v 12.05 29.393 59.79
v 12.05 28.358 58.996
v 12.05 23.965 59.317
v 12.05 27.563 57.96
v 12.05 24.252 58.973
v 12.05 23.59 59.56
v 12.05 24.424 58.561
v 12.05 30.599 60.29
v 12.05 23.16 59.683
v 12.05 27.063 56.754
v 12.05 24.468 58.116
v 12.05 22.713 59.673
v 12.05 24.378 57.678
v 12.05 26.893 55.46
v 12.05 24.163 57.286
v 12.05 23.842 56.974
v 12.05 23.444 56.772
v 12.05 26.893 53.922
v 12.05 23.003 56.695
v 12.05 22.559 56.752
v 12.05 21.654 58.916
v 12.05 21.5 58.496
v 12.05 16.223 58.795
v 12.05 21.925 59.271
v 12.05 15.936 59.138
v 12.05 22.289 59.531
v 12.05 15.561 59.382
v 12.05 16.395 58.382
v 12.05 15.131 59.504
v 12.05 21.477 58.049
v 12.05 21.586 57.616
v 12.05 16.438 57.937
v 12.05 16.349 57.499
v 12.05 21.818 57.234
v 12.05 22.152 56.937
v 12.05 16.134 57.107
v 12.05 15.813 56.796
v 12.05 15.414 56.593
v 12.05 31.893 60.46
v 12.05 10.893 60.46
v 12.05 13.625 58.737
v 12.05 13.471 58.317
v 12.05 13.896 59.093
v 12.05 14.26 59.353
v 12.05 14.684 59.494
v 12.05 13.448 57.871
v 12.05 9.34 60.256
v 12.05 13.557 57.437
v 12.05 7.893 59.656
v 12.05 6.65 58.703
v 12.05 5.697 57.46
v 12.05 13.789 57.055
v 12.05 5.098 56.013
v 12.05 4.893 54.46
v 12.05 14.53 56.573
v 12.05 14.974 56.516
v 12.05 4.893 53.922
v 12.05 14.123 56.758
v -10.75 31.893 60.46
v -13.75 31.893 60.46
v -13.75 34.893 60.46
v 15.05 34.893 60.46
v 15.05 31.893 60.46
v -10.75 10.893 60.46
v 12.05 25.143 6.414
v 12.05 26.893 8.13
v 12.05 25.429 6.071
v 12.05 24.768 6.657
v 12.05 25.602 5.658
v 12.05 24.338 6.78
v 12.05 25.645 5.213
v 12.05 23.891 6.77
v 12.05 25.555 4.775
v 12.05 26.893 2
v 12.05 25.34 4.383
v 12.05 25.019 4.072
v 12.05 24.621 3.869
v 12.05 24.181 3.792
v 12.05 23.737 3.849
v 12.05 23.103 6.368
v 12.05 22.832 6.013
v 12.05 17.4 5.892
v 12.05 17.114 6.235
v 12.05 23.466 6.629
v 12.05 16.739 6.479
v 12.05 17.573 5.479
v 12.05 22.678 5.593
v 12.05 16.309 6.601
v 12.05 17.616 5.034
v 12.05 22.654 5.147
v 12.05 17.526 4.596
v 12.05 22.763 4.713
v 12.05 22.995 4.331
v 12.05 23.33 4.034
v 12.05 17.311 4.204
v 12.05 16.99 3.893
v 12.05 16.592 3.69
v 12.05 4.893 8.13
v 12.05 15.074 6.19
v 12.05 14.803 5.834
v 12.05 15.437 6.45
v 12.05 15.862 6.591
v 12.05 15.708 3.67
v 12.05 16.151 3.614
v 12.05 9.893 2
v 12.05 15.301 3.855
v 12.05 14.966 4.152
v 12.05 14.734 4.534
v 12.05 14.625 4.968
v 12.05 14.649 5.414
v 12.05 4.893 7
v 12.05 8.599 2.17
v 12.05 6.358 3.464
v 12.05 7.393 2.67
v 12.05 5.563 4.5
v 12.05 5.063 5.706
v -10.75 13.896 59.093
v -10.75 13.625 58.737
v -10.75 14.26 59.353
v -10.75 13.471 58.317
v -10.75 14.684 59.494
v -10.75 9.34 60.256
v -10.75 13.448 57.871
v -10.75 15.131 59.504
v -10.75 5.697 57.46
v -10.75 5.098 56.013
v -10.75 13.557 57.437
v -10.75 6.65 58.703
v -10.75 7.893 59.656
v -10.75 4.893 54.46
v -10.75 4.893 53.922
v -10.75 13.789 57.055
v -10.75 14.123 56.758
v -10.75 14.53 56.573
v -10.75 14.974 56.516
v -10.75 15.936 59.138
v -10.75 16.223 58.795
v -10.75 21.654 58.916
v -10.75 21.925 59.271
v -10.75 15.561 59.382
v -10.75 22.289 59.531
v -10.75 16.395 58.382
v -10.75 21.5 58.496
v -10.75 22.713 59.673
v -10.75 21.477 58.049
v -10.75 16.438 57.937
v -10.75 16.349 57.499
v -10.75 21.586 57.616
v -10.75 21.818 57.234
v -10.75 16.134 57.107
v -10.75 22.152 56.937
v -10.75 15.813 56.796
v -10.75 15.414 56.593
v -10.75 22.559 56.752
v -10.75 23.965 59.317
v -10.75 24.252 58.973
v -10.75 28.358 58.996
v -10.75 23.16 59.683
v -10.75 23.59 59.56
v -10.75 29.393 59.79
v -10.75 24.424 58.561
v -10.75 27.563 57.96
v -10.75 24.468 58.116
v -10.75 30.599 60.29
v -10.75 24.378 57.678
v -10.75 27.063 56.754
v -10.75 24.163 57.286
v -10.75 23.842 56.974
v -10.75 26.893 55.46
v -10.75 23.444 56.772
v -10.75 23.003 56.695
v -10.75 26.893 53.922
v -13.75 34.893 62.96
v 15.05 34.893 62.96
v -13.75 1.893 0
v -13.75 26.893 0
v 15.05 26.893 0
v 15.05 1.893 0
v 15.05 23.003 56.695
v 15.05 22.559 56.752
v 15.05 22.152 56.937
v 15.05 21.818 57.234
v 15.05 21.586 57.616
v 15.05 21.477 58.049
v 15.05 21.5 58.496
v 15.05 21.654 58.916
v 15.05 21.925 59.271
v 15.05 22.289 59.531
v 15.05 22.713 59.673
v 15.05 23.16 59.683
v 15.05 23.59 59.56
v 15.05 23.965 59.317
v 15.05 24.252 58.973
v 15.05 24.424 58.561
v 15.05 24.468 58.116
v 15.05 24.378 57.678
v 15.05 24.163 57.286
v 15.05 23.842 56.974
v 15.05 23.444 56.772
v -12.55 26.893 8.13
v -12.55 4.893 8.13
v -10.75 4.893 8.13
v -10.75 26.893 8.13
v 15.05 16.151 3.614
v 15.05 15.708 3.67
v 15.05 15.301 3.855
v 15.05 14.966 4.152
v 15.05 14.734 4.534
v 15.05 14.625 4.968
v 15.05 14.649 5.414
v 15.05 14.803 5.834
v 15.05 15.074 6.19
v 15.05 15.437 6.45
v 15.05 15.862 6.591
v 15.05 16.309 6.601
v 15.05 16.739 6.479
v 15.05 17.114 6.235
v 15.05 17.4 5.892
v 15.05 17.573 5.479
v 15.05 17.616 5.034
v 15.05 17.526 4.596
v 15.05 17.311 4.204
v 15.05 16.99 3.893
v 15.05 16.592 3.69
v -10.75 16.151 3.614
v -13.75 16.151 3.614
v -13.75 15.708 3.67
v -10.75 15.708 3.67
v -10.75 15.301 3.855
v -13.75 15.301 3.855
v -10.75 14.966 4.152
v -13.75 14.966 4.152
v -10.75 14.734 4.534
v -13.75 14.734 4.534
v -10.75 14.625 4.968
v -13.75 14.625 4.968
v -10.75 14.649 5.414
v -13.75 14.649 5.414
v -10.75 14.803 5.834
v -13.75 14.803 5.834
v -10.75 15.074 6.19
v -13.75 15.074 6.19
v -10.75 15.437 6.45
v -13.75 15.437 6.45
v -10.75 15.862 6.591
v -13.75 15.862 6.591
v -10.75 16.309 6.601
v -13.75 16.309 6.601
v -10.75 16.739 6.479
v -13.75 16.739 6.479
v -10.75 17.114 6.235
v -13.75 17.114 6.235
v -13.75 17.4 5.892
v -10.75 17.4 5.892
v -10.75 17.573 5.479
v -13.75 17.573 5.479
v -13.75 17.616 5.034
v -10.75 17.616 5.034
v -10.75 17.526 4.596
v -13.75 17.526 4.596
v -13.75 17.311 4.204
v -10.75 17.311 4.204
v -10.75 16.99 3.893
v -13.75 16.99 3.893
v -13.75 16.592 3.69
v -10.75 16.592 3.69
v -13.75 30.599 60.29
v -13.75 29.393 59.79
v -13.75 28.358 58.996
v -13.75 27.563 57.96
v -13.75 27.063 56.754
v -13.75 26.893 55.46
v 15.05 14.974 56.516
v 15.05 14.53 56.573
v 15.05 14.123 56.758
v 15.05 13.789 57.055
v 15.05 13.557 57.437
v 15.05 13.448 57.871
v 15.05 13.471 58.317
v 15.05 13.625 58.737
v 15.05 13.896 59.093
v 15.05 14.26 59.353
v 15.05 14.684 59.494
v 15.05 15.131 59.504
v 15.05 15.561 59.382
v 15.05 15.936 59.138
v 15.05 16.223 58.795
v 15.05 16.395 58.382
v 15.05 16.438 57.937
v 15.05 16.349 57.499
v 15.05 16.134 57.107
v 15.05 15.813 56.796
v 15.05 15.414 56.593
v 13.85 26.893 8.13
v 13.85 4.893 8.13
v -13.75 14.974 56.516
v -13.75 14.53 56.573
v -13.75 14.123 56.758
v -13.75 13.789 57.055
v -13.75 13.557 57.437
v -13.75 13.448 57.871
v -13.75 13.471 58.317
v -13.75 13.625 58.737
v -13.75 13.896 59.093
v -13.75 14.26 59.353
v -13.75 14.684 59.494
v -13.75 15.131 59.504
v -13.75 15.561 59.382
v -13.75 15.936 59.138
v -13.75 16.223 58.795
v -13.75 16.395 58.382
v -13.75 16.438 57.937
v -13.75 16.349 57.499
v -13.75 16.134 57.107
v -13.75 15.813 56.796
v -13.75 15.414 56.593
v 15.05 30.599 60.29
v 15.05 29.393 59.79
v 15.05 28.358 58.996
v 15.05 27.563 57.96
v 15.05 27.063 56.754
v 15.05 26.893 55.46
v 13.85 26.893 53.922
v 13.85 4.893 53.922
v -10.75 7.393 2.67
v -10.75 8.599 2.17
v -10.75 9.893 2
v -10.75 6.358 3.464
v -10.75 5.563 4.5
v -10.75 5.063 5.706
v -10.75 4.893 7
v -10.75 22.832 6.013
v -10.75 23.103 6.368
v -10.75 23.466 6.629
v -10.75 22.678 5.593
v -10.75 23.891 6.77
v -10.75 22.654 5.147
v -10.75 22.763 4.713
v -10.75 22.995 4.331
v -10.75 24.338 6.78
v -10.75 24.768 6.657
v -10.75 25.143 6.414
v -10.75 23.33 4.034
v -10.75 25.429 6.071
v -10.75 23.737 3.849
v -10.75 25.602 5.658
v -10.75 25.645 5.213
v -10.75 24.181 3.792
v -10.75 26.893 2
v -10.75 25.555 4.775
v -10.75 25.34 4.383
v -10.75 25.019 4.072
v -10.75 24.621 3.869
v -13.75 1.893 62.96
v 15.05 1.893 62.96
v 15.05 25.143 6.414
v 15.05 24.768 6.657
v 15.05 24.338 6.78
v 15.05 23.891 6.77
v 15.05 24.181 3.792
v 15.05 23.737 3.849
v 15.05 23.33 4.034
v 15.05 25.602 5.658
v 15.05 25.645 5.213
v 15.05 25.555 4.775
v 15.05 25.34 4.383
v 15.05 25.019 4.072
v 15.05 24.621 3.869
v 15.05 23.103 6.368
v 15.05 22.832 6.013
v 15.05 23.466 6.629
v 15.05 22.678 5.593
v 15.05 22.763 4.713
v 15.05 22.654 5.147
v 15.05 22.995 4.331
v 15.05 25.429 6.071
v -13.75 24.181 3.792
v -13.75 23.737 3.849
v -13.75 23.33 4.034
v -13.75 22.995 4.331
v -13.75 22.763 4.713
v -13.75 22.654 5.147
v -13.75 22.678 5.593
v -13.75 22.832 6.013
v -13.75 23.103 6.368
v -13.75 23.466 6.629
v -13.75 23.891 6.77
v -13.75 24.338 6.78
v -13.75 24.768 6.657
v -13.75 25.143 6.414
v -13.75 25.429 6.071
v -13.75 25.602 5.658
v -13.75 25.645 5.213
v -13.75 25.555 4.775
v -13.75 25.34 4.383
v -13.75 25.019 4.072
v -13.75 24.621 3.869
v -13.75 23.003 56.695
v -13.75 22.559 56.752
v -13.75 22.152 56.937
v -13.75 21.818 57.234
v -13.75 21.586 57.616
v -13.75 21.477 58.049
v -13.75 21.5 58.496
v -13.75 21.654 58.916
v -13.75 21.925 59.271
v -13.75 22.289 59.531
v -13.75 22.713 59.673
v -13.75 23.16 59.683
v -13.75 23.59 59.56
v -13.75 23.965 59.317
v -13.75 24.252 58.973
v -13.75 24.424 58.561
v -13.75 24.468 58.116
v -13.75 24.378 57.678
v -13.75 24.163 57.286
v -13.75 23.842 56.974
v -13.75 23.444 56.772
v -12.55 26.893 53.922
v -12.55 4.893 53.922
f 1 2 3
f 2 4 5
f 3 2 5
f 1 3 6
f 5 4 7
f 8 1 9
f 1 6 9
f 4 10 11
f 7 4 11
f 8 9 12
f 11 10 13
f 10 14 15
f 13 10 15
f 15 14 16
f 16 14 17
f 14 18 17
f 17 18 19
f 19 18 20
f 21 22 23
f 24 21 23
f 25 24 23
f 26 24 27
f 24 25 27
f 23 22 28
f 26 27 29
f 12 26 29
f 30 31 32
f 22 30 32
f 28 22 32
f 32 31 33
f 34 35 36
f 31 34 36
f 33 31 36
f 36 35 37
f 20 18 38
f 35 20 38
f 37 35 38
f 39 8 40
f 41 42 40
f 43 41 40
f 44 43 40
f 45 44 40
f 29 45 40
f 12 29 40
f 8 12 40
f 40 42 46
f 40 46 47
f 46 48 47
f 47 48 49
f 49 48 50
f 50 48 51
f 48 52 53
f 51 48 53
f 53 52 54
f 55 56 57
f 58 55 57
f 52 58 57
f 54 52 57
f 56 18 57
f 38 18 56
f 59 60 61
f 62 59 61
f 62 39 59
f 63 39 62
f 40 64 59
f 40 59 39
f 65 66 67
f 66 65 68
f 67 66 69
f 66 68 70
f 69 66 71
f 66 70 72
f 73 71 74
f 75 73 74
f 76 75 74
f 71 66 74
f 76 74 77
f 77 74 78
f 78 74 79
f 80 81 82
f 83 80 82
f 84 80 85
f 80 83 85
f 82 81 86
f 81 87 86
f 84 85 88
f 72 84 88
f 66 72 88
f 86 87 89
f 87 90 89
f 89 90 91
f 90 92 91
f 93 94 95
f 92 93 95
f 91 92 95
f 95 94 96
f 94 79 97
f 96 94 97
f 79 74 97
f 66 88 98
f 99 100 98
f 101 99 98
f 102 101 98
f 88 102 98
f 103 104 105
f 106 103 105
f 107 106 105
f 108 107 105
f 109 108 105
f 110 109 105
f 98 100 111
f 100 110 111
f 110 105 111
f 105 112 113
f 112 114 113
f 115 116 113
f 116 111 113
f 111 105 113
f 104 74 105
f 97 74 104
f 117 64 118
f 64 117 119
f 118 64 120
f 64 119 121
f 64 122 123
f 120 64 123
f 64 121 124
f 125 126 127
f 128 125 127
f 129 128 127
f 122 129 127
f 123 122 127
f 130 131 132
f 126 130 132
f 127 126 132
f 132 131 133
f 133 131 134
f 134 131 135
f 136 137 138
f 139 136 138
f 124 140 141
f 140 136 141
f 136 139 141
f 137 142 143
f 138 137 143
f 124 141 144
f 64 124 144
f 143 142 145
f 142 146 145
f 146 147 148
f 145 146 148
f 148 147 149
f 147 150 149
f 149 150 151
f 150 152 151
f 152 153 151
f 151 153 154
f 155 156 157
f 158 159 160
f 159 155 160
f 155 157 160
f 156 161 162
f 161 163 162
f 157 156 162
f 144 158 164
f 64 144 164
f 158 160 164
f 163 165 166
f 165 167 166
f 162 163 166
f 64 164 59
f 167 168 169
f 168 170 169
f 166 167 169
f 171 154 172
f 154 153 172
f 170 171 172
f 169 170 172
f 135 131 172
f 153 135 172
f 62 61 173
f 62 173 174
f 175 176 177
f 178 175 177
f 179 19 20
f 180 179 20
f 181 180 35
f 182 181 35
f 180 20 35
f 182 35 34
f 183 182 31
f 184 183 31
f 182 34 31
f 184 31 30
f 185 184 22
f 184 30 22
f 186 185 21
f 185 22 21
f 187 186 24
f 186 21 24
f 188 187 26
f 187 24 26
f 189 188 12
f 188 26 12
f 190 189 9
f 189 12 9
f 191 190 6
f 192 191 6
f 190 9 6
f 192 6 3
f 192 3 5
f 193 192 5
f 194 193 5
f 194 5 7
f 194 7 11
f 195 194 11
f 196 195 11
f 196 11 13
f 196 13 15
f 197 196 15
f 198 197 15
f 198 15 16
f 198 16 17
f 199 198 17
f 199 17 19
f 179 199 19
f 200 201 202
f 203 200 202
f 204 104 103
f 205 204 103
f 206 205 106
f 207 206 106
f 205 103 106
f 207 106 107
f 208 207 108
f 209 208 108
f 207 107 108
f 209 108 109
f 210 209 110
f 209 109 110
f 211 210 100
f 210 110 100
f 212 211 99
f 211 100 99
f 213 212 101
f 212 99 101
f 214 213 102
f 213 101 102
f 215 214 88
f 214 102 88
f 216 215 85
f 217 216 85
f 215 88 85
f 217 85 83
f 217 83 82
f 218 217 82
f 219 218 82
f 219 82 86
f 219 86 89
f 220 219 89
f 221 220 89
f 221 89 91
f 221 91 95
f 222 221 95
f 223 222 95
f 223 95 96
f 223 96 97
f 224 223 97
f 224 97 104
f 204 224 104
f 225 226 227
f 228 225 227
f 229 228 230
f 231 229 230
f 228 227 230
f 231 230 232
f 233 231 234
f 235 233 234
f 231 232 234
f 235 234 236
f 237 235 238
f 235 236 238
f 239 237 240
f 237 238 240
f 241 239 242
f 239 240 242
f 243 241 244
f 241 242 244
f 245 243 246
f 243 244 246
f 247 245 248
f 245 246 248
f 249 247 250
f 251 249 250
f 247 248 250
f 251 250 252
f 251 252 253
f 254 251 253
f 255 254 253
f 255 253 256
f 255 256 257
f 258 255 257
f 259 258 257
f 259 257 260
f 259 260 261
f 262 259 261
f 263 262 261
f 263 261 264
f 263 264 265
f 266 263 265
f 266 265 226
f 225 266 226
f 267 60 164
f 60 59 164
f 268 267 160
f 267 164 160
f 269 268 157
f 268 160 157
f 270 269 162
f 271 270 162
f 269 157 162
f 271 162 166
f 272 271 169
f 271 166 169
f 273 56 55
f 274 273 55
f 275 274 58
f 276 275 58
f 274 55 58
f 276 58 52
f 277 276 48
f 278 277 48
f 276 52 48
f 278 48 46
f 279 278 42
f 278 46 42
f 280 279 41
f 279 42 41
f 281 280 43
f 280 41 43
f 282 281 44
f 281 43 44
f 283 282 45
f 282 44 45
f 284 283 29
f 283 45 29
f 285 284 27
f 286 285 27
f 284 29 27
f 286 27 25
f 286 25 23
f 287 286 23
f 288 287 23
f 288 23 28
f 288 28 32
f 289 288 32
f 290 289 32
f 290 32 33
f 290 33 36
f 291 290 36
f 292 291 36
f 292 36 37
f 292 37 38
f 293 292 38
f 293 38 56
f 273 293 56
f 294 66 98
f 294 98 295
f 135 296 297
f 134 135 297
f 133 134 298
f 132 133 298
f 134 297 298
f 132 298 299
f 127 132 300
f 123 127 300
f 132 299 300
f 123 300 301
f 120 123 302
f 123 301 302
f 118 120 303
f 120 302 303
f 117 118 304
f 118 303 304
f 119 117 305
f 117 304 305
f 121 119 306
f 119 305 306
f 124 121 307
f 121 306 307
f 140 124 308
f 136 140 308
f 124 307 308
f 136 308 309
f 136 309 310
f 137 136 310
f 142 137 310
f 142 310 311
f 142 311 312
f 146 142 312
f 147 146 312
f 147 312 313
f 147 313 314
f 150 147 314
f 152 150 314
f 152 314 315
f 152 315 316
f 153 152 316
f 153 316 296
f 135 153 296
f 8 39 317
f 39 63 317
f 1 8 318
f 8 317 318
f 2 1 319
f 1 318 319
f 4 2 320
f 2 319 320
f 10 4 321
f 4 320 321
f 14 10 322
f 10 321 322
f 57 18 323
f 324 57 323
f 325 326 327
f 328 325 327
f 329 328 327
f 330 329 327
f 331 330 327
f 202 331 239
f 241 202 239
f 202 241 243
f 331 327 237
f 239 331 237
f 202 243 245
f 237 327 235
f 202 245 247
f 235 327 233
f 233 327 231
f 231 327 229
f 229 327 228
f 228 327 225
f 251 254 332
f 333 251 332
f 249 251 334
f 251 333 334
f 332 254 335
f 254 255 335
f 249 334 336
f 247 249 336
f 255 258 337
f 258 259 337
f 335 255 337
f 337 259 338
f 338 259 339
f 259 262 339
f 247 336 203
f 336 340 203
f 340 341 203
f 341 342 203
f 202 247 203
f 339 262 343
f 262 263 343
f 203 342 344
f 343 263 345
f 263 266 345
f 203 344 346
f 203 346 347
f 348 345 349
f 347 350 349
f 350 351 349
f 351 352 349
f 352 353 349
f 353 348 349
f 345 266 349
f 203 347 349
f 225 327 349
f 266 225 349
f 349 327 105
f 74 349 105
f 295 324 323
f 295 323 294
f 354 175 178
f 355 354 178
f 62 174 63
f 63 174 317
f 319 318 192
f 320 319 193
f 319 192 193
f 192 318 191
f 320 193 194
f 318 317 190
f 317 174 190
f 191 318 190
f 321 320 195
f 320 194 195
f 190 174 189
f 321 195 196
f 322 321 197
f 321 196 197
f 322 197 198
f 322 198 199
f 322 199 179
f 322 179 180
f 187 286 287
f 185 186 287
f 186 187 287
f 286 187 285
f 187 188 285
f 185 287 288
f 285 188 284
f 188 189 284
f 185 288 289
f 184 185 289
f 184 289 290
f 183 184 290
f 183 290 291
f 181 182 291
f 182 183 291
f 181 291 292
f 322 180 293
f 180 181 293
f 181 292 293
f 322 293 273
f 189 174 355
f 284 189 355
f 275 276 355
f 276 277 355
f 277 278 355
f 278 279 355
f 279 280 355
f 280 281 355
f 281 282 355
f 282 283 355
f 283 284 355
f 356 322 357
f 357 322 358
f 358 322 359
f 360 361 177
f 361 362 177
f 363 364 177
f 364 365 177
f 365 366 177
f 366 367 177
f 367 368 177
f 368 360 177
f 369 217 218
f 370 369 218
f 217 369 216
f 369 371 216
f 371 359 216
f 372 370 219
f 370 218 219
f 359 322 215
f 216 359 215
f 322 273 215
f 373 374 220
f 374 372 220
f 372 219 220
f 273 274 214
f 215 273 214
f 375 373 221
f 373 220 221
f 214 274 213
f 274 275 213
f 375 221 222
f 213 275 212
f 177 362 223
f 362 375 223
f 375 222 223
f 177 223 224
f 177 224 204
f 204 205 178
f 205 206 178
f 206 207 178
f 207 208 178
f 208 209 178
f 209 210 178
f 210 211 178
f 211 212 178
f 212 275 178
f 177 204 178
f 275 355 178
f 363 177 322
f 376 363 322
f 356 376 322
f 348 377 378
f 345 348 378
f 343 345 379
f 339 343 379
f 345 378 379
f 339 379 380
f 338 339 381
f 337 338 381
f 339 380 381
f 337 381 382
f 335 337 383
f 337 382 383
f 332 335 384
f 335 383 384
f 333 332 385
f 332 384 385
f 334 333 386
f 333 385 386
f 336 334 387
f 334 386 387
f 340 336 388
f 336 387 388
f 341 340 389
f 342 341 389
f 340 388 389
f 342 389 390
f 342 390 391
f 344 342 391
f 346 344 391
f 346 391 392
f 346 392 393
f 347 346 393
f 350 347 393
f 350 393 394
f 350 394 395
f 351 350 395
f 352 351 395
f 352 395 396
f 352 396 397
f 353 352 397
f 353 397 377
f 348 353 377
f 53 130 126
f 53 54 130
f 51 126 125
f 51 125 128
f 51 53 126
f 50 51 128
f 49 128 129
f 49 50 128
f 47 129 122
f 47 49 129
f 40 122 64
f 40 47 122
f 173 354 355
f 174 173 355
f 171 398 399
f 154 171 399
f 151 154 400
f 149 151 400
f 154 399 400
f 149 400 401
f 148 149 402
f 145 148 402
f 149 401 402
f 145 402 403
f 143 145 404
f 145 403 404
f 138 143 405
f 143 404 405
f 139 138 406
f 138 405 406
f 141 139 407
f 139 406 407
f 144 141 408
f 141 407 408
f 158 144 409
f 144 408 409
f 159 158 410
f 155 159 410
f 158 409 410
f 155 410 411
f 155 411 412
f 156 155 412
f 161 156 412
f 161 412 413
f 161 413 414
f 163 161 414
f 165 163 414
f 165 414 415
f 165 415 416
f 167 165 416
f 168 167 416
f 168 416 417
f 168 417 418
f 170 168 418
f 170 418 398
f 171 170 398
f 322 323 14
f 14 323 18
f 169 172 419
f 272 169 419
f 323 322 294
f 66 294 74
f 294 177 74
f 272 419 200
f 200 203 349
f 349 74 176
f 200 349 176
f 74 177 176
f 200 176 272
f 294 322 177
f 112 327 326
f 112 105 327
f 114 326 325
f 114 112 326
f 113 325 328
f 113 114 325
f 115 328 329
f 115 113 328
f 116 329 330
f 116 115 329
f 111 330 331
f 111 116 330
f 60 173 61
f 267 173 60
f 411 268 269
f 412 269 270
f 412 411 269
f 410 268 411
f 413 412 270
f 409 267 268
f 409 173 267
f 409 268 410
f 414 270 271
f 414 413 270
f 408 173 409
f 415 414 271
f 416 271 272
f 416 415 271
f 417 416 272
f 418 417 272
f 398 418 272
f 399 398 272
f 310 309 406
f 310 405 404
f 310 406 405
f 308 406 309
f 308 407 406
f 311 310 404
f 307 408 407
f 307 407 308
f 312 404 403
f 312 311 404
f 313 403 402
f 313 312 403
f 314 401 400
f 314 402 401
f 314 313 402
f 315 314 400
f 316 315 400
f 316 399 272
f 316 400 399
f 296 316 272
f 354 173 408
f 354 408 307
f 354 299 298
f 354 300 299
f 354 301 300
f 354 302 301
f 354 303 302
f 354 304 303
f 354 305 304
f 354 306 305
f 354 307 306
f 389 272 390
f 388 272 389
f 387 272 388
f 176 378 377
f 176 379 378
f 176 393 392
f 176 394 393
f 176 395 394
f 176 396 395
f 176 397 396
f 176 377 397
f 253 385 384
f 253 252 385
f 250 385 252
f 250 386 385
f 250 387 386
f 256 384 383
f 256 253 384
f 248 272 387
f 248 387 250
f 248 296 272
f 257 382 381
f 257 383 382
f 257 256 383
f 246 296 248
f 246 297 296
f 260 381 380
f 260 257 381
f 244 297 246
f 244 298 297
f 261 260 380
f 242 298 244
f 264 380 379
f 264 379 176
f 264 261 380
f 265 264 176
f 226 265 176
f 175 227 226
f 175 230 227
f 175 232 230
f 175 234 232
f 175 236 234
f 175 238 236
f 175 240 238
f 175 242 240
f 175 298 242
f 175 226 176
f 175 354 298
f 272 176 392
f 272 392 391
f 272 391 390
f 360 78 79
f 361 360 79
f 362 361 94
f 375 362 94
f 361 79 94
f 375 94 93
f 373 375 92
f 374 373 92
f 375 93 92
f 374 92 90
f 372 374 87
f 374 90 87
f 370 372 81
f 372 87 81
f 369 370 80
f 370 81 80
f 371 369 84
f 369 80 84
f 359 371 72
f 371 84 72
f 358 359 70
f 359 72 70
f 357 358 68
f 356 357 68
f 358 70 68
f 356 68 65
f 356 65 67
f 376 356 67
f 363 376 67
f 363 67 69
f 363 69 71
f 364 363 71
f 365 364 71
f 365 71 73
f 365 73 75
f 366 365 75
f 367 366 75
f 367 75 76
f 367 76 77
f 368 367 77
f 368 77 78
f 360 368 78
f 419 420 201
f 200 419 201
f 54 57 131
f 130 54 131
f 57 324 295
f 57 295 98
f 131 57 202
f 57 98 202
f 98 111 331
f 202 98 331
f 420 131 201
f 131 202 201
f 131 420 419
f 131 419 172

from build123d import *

# Parameters (mm, degrees)
EXTRUDE_1_DEPTH     = 62.96
SKETCH_2_W          = 28.8
SKETCH_2_H          = 2
EXTRUDE_2_DEPTH     = 22
SKETCH_7_W          = 1.8
SKETCH_7_H          = 45.791930202
CUT_EXTRUDE_1_DEPTH = 22
FILLET_2_R          = 5
MM_PRESS_3_D        = 3
SKETCH_14_W         = 28.8
SKETCH_14_H         = 2.5
EXTRUDE_3_DEPTH     = 30
FILLET_3_R          = 6
FILLET_4_R          = 5


with BuildPart() as part:
    # 草图1 → 凸台-拉伸1 (new body)
    with BuildSketch(Plane.XY):
        Polygon((-13.750151713, 26.893062898), (-13.750151713, 1.893062898), (15.049848287, 1.893062898), (15.049848287, 26.893062898), (12.049848287, 26.893062898), (12.049848287, 4.893062898), (-10.750151713, 4.893062898), (-10.750151713, 26.893062898), align=None)
    extrude(amount=EXTRUDE_1_DEPTH)

    # 草图2 → 凸台-拉伸2 (add)
    with BuildSketch(Plane(origin=(0, 4.893062898, 0), x_dir=(1, 0, 0), z_dir=(0, 1, 0))):
        with Locations((0.649848287, -1)):
            Rectangle(SKETCH_2_W, SKETCH_2_H)
    extrude(amount=EXTRUDE_2_DEPTH)

    # 草图7 → 切除-拉伸1 (cut)
    with BuildSketch(Plane(origin=(0, 4.893062898, 0), x_dir=(1, 0, 0), z_dir=(0, 1, 0))):
        with Locations((-11.650151713, -31.026293471)):
            Rectangle(SKETCH_7_W, SKETCH_7_H)
        with Locations((12.949848287, -31.026293471)):
            Rectangle(SKETCH_7_W, SKETCH_7_H)
    extrude(amount=CUT_EXTRUDE_1_DEPTH, mode=Mode.SUBTRACT)

    # 圆角2
    fillet_2_edges = [part.edges().sort_by_distance(p)[0] for p in [
        (0.649848287, 4.893062898, 2),
    ]]
    fillet(fillet_2_edges, radius=FILLET_2_R)

    # 大小mm Press 暗销孔3 (through all)
    with Locations(Plane(origin=(15.049848287, 207.544632648, -30.881320252), x_dir=(0, -0.022253058, 0.99975237), z_dir=(1, 0, 0))):
        with Locations((93.161367469, 190.578219389), (93.161367469, 182.547127137), (40.245392963, 190.578219389), (40.245392963, 182.547127137)):
            Hole(MM_PRESS_3_D / 2)

    # 草图14 → 凸台-拉伸3 (add)
    with BuildSketch(Plane(origin=(0, 4.893062898, 0), x_dir=(1, 0, 0), z_dir=(0, 1, 0))):
        with Locations((0.649848287, -61.71)):
            Rectangle(SKETCH_14_W, SKETCH_14_H)
    extrude(amount=EXTRUDE_3_DEPTH)

    # 圆角3
    fillet_3_edges = [part.edges().sort_by_distance(p)[0] for p in [
        (0.649848287, 4.893062898, 60.46),
    ]]
    fillet(fillet_3_edges, radius=FILLET_3_R)

    # 圆角4
    fillet_4_edges = [part.edges().sort_by_distance(p)[0] for p in [
        (13.549848287, 26.893062898, 60.46),
        (-12.250151713, 26.893062898, 60.46),
    ]]
    fillet(fillet_4_edges, radius=FILLET_4_R)


solid = part.part
